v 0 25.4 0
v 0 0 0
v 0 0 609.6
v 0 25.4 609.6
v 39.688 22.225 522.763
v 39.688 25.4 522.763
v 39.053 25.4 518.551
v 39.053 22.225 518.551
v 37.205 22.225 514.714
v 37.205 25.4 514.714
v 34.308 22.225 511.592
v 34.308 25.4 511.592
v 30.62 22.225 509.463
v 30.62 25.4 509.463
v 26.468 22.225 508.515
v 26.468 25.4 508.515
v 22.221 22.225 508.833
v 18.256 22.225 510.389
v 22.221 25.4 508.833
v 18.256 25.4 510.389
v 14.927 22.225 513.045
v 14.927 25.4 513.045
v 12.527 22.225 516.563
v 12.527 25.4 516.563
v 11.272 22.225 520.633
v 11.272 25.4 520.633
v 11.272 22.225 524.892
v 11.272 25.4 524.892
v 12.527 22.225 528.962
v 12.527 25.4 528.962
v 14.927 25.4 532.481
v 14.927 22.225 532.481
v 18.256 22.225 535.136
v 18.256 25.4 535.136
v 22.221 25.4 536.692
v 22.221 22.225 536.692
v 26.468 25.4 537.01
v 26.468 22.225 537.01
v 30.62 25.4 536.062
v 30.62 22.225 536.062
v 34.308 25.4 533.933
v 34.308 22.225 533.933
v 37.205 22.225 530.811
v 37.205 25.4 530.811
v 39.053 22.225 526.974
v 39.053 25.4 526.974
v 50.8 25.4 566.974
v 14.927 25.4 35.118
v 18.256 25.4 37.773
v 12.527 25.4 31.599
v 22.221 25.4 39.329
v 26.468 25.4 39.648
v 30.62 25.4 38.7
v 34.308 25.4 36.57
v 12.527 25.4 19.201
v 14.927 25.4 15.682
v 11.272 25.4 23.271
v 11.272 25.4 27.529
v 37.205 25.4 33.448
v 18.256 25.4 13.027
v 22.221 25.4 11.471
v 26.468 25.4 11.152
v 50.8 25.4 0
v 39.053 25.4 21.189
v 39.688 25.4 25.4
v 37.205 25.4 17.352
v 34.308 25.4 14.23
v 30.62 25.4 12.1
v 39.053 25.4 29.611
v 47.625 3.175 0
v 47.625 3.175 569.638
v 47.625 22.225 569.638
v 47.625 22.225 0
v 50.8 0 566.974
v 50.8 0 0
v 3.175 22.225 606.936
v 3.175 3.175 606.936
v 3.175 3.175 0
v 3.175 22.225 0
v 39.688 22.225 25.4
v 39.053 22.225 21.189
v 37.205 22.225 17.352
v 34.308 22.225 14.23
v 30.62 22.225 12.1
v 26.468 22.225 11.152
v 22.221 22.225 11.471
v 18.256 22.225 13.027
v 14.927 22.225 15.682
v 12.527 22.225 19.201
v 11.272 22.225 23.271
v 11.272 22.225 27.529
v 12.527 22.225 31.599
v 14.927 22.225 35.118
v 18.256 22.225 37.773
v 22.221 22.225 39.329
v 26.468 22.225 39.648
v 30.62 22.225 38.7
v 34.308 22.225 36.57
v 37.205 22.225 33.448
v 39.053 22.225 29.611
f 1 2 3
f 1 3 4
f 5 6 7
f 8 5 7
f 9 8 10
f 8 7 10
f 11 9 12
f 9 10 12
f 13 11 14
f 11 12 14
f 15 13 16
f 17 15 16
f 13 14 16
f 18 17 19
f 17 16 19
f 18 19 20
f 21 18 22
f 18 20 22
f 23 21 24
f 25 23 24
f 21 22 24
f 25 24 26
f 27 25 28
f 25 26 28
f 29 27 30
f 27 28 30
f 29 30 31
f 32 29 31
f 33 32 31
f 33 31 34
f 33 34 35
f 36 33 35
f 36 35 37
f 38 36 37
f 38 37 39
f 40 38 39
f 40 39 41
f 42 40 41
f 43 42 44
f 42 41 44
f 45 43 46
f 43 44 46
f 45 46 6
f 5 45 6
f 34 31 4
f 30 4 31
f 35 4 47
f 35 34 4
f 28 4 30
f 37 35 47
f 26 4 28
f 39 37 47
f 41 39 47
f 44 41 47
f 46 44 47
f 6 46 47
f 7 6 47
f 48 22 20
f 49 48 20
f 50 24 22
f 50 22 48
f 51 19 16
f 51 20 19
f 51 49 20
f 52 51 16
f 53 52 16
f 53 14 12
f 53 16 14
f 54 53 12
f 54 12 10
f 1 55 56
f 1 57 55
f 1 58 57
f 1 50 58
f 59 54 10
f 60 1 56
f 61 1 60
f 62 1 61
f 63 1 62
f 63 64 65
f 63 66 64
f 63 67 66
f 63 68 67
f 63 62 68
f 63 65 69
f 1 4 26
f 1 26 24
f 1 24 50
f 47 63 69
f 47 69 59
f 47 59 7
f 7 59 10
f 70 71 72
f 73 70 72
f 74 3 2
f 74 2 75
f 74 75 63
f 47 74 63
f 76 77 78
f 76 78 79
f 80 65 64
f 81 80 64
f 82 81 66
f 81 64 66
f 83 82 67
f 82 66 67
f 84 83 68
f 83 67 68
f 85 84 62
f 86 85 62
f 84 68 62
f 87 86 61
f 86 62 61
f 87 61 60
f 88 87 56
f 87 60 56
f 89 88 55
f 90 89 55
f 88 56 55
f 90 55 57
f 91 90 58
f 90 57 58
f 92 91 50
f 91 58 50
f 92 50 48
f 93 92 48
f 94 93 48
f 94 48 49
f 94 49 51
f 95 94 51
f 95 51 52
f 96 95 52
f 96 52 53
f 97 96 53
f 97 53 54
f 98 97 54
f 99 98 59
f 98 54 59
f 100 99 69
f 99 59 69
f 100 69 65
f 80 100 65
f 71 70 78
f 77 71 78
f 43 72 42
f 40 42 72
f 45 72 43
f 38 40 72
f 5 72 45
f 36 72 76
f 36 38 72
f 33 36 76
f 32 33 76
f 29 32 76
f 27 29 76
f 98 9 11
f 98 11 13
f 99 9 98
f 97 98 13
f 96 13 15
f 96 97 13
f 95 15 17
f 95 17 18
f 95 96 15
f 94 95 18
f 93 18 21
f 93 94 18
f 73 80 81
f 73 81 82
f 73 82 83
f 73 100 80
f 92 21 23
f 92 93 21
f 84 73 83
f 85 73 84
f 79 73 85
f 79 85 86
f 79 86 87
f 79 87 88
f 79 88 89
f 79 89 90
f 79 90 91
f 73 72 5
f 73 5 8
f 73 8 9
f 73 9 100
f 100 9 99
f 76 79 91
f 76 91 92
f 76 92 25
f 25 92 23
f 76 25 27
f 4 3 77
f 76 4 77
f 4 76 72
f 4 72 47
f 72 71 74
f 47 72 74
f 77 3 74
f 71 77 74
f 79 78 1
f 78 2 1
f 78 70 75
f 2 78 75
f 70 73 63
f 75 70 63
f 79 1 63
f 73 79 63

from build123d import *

# Parameters (mm, degrees)
SKETCH1_W           = 50.8
SKETCH1_H           = 25.4
BOSS_EXTRUDE1_DEPTH = 609.6
SKETCH2_W           = 44.45
SKETCH2_H           = 19.05
CUT_EXTRUDE1_DEPTH  = 609.6
CUT_EXTRUDE3_DEPTH  = 25.4
SKETCH6_R           = 14.2875
CUT_EXTRUDE5_DEPTH  = 3.175
SKETCH8_R           = 14.2875
CUT_EXTRUDE7_DEPTH  = 3.175


with BuildPart() as part:
    # Sketch1 → Boss-Extrude1 (new body)
    with BuildSketch(Plane.XY):
        with Locations((25.4, 12.7)):
            Rectangle(SKETCH1_W, SKETCH1_H)
    extrude(amount=BOSS_EXTRUDE1_DEPTH)

    # Sketch2 → Cut-Extrude1 (cut)
    with BuildSketch(Plane(origin=(0, 0, 0), x_dir=(-1, 0, 0), z_dir=(0, 0, -1))):
        with Locations((-25.4, 12.7)):
            Rectangle(SKETCH2_W, SKETCH2_H)
    extrude(amount=-CUT_EXTRUDE1_DEPTH, mode=Mode.SUBTRACT)

    # Sketch4 → Cut-Extrude3 (cut)
    with BuildSketch(Plane.XZ):
        Polygon((0, 609.6), (50.8, 566.973738736), (50.8, 609.6), align=None)
    extrude(amount=-CUT_EXTRUDE3_DEPTH, mode=Mode.SUBTRACT)

    # Sketch6 → Cut-Extrude5 (cut)
    with BuildSketch(Plane(origin=(0, 25.4, 0), x_dir=(1, 0, 0), z_dir=(0, 1, 0))):
        with Locations((25.4, -25.4)):
            Circle(SKETCH6_R)
    extrude(amount=-CUT_EXTRUDE5_DEPTH, mode=Mode.SUBTRACT)

    # Sketch8 → Cut-Extrude7 (cut)
    with BuildSketch(Plane(origin=(0, 25.4, 0), x_dir=(1, 0, 0), z_dir=(0, 1, 0))):
        with Locations((25.4, -522.762581257)):
            Circle(SKETCH8_R)
    extrude(amount=-CUT_EXTRUDE7_DEPTH, mode=Mode.SUBTRACT)


solid = part.part
